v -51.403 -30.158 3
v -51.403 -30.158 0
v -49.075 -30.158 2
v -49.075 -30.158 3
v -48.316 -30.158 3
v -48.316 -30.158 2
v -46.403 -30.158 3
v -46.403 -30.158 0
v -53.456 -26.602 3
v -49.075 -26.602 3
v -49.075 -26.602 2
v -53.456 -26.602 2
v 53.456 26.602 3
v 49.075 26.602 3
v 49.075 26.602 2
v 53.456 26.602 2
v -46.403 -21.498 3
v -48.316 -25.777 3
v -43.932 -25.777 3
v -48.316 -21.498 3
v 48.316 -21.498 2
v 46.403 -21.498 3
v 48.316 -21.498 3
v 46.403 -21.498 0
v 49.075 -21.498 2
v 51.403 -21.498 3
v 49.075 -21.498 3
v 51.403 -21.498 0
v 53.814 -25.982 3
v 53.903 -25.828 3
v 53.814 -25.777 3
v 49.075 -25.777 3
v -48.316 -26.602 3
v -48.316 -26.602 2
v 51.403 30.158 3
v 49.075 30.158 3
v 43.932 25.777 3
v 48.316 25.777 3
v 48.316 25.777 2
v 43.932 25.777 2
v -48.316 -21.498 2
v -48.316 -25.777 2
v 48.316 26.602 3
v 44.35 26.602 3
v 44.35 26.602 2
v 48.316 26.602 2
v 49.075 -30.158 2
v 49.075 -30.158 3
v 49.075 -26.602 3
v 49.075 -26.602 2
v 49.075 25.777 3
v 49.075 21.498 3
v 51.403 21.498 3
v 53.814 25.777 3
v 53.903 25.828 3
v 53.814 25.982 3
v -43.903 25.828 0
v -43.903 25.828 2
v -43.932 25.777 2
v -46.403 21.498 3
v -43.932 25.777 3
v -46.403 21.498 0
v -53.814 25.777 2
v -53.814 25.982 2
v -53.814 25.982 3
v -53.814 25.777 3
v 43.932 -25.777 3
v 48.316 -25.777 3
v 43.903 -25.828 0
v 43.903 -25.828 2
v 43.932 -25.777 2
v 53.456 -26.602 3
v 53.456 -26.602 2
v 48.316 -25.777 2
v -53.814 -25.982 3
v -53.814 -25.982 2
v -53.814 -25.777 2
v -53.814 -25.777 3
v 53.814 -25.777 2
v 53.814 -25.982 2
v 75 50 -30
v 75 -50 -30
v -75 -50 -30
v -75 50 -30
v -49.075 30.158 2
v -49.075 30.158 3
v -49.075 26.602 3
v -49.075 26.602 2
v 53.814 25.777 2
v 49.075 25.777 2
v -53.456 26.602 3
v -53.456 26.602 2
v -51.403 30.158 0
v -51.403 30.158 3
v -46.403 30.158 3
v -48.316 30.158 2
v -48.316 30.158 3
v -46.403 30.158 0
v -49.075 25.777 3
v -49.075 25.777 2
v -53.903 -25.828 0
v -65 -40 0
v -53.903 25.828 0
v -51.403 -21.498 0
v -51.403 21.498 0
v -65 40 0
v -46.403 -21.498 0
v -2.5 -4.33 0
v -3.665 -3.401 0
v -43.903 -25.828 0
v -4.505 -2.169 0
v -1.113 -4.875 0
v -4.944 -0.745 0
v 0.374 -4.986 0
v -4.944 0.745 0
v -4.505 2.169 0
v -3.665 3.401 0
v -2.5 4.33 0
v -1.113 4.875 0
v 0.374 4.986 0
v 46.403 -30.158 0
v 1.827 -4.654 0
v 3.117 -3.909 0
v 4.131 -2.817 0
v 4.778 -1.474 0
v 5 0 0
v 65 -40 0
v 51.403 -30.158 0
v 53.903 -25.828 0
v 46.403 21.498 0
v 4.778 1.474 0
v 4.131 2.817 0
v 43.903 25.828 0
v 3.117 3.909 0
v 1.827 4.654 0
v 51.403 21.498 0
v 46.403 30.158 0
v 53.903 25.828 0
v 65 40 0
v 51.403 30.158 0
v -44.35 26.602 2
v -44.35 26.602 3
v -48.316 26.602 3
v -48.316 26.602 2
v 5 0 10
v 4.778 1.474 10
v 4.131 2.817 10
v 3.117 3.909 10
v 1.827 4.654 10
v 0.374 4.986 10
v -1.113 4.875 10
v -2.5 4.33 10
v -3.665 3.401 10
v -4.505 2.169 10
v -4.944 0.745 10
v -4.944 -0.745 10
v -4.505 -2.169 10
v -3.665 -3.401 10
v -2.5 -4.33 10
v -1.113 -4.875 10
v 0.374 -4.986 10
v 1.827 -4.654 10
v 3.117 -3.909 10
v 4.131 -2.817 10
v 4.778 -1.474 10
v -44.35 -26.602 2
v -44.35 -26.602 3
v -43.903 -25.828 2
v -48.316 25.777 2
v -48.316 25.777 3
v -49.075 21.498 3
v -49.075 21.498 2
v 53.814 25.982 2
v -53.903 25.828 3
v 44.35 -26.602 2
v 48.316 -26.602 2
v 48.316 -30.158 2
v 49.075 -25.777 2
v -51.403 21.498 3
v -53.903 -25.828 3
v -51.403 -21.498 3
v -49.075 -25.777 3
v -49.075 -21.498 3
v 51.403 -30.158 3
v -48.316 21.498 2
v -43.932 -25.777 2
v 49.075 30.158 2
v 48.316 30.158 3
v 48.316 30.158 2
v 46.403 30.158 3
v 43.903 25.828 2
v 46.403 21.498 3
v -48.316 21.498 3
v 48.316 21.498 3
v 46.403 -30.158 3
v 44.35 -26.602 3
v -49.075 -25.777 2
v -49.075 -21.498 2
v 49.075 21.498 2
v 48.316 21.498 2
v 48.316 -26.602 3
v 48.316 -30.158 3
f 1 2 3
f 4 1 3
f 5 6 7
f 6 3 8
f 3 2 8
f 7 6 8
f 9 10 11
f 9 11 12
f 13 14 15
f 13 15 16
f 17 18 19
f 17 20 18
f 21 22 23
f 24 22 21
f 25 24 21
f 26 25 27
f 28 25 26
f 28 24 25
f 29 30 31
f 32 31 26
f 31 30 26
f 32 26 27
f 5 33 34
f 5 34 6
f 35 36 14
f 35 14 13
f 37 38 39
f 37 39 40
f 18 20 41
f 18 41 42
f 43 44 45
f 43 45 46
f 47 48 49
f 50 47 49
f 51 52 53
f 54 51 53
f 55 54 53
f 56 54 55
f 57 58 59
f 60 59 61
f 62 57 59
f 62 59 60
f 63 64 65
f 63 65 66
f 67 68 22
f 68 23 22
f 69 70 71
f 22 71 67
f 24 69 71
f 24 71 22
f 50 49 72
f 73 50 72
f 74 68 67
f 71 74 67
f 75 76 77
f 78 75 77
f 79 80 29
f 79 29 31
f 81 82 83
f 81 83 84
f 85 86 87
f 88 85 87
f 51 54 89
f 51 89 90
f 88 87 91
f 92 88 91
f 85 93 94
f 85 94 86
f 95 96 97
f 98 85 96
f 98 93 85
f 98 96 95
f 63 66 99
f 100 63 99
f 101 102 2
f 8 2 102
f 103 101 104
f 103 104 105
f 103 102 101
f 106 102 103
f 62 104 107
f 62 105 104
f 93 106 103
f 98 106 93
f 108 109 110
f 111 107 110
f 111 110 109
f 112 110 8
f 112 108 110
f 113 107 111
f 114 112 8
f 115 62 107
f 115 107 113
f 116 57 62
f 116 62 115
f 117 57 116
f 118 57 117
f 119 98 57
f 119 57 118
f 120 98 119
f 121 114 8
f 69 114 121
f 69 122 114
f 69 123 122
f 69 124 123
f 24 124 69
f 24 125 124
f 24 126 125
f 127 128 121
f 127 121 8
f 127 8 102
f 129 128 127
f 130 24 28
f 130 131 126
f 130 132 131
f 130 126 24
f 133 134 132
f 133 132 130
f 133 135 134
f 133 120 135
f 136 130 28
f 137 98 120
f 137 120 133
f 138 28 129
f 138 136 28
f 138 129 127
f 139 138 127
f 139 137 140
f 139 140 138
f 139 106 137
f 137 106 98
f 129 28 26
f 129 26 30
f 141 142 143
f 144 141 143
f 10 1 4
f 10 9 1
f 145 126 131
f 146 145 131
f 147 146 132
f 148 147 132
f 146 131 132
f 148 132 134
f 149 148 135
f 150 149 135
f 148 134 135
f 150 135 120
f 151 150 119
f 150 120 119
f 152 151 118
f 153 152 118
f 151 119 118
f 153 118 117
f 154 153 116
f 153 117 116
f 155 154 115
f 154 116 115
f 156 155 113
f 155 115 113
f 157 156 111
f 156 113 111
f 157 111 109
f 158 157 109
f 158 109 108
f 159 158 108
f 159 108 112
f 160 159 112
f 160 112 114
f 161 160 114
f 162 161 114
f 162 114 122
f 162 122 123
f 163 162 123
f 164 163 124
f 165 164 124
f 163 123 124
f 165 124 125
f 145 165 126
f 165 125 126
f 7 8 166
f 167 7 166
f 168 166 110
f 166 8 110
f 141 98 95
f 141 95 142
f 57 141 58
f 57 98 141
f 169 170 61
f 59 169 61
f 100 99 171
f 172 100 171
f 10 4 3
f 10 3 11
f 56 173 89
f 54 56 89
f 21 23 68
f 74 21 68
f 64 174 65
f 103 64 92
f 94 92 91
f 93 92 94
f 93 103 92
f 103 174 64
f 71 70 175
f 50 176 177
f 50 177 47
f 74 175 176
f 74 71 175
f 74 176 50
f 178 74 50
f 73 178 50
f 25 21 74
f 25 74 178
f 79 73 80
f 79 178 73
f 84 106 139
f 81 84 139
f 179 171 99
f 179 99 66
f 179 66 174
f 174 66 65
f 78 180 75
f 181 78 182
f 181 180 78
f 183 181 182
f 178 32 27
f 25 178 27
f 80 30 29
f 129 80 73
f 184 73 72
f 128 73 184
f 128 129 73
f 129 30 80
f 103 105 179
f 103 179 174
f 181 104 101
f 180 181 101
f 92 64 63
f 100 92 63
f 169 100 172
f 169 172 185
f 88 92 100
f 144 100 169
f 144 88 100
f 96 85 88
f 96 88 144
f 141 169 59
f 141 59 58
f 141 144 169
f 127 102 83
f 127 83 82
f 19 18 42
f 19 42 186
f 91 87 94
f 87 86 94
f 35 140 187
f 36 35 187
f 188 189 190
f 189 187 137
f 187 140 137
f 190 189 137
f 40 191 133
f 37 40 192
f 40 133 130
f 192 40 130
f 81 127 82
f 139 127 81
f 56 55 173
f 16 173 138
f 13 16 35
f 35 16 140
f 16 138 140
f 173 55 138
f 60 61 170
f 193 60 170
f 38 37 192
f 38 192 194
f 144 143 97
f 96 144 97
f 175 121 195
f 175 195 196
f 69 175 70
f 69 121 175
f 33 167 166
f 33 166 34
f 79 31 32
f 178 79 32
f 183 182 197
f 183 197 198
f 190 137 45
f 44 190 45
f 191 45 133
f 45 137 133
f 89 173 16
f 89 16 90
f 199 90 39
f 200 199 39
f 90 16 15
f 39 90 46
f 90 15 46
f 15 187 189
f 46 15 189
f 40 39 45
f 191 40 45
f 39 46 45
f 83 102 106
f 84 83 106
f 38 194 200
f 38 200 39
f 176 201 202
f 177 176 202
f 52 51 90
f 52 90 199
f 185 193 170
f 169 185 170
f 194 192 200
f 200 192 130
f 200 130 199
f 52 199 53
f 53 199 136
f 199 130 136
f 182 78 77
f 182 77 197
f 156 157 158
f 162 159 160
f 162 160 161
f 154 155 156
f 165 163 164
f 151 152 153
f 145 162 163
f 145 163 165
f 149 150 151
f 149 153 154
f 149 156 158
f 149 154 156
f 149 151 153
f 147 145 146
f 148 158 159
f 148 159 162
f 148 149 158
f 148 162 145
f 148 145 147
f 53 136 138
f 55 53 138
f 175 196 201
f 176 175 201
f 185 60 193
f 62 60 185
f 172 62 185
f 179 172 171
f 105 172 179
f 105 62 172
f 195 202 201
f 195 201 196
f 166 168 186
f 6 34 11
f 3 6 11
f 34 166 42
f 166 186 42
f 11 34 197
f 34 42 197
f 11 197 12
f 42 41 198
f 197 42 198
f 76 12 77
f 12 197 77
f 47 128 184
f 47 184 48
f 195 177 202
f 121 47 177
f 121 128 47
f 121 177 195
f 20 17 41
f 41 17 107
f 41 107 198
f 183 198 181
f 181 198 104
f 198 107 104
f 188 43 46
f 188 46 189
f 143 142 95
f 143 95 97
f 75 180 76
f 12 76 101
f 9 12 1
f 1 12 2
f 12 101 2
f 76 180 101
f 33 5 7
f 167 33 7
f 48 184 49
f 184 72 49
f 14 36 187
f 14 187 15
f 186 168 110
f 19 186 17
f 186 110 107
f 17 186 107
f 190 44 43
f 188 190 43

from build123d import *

# Parameters (mm, degrees)
SKETCH2_W             = 150
SKETCH2_H             = 100
BOSS_EXTRUDE1_DEPTH   = 50
CHAMFER1_SIZE         = 30
CHAMFER1_SIZE2        = 10
CHAMFER1_PART_2_SIZE  = 30
CHAMFER1_PART_2_SIZE2 = 10
CHAMFER1_PART_3_SIZE  = 30
CHAMFER1_PART_3_SIZE2 = 10
CHAMFER1_PART_4_SIZE  = 30
CHAMFER1_PART_4_SIZE2 = 10
CUT_EXTRUDE1_DEPTH    = 282
BOSS_EXTRUDE2_DEPTH   = 3
CUT_EXTRUDE2_DEPTH    = 1
SKETCH9_R             = 5
BOSS_EXTRUDE3_DEPTH   = 10


with BuildPart() as part:
    # Sketch2 → Boss-Extrude1 (new body)
    with BuildSketch(Plane.XY):
        Rectangle(SKETCH2_W, SKETCH2_H)
    extrude(amount=-BOSS_EXTRUDE1_DEPTH)

    # Chamfer1
    chamfer1_edges = [part.edges().sort_by_distance(p)[0] for p in [
        (0, -50, 0),
    ]]
    chamfer1_side = [part.faces().sort_by_distance(p)[0] for p in [
        (0, -50, -25),
    ]]
    chamfer(chamfer1_edges, length=CHAMFER1_SIZE, length2=CHAMFER1_SIZE2, reference=chamfer1_side[0])

    # Chamfer1 part 2
    chamfer1_part_2_edges = [part.edges().sort_by_distance(p)[0] for p in [
        (-75, 0, 0),
    ]]
    chamfer1_part_2_side = [part.faces().sort_by_distance(p)[0] for p in [
        (-75, 0, -25),
    ]]
    chamfer(chamfer1_part_2_edges, length=CHAMFER1_PART_2_SIZE, length2=CHAMFER1_PART_2_SIZE2, reference=chamfer1_part_2_side[0])

    # Chamfer1 part 3
    chamfer1_part_3_edges = [part.edges().sort_by_distance(p)[0] for p in [
        (0, 50, 0),
    ]]
    chamfer1_part_3_side = [part.faces().sort_by_distance(p)[0] for p in [
        (0, 50, -25),
    ]]
    chamfer(chamfer1_part_3_edges, length=CHAMFER1_PART_3_SIZE, length2=CHAMFER1_PART_3_SIZE2, reference=chamfer1_part_3_side[0])

    # Chamfer1 part 4
    chamfer1_part_4_edges = [part.edges().sort_by_distance(p)[0] for p in [
        (75, 0, 0),
    ]]
    chamfer1_part_4_side = [part.faces().sort_by_distance(p)[0] for p in [
        (75, 0, -25),
    ]]
    chamfer(chamfer1_part_4_edges, length=CHAMFER1_PART_4_SIZE, length2=CHAMFER1_PART_4_SIZE2, reference=chamfer1_part_4_side[0])

    # Sketch5 → Cut-Extrude1 (cut)
    with BuildSketch(Plane(origin=(75, 0, 0), x_dir=(0, 0, -1), z_dir=(1, 0, 0))):
        Polygon((30, -50), (30, 50), (81.32895228, 62.665959411), (65.838490403, -81.97874305), align=None)
    extrude(amount=-CUT_EXTRUDE1_DEPTH, mode=Mode.SUBTRACT)

    # Sketch6 → Boss-Extrude2 (add)
    with BuildSketch(Plane.XY):
        Polygon((-43.903010181, -25.827914317), (-46.403010181, -21.497787298), (-51.403010181, -21.497787298), (-53.903010181, -25.827914317), (-51.403010181, -30.158041336), (-46.403010181, -30.158041336), align=None)
        Polygon((43.903010181, 25.827914317), (46.403010181, 21.497787298), (51.403010181, 21.497787298), (53.903010181, 25.827914317), (51.403010181, 30.158041336), (46.403010181, 30.158041336), align=None)
        Polygon((46.403010181, -30.158041336), (43.903010181, -25.827914317), (46.403010181, -21.497787298), (51.403010181, -21.497787298), (53.903010181, -25.827914317), (51.403010181, -30.158041336), align=None)
        Polygon((-46.403010181, 21.497787298), (-51.403010181, 21.497787298), (-53.903010181, 25.827914317), (-51.403010181, 30.158041336), (-46.403010181, 30.158041336), (-43.903010181, 25.827914317), align=None)
    extrude(amount=BOSS_EXTRUDE2_DEPTH)

    # Sketch7 → Cut-Extrude2 (cut)
    with BuildSketch(Plane.XY.offset(3)):
        Polygon((-49.074995517, -20.874091647), (-48.315685666, -20.874091647), (-48.315685666, -25.776876491), (-43.576392296, -25.776876491), (-43.576392296, -26.601644718), (-48.315685666, -26.601644718), (-48.315685666, -31.504429563), (-49.074995517, -31.504429563), (-49.074995517, -26.601644718), (-53.814288887, -26.601644718), (-53.814288887, -25.776876491), (-49.074995517, -25.776876491), align=None)
        Polygon((48.315685666, -26.601644718), (48.315685666, -31.504429563), (49.074995517, -31.504429563), (49.074995517, -26.601644718), (53.814288887, -26.601644718), (53.814288887, -25.776876491), (49.074995517, -25.776876491), (49.074995517, -20.874091647), (48.315685666, -20.874091647), (48.315685666, -25.776876491), (43.576392296, -25.776876491), (43.576392296, -26.601644718), align=None)
        Polygon((-48.315685666, 26.601644718), (-48.315685666, 31.504429563), (-49.074995517, 31.504429563), (-49.074995517, 26.601644718), (-53.814288887, 26.601644718), (-53.814288887, 25.776876491), (-49.074995517, 25.776876491), (-49.074995517, 20.874091647), (-48.315685666, 20.874091647), (-48.315685666, 25.776876491), (-43.576392296, 25.776876491), (-43.576392296, 26.601644718), align=None)
        Polygon((49.074995517, 20.874091647), (48.315685666, 20.874091647), (48.315685666, 25.776876491), (43.576392296, 25.776876491), (43.576392296, 26.601644718), (48.315685666, 26.601644718), (48.315685666, 31.504429563), (49.074995517, 31.504429563), (49.074995517, 26.601644718), (53.814288887, 26.601644718), (53.814288887, 25.776876491), (49.074995517, 25.776876491), align=None)
    extrude(amount=-CUT_EXTRUDE2_DEPTH, mode=Mode.SUBTRACT)

    # Sketch9 → Boss-Extrude3 (add)
    with BuildSketch(Plane.XY):
        Circle(SKETCH9_R)
    extrude(amount=BOSS_EXTRUDE3_DEPTH)


solid = part.part
